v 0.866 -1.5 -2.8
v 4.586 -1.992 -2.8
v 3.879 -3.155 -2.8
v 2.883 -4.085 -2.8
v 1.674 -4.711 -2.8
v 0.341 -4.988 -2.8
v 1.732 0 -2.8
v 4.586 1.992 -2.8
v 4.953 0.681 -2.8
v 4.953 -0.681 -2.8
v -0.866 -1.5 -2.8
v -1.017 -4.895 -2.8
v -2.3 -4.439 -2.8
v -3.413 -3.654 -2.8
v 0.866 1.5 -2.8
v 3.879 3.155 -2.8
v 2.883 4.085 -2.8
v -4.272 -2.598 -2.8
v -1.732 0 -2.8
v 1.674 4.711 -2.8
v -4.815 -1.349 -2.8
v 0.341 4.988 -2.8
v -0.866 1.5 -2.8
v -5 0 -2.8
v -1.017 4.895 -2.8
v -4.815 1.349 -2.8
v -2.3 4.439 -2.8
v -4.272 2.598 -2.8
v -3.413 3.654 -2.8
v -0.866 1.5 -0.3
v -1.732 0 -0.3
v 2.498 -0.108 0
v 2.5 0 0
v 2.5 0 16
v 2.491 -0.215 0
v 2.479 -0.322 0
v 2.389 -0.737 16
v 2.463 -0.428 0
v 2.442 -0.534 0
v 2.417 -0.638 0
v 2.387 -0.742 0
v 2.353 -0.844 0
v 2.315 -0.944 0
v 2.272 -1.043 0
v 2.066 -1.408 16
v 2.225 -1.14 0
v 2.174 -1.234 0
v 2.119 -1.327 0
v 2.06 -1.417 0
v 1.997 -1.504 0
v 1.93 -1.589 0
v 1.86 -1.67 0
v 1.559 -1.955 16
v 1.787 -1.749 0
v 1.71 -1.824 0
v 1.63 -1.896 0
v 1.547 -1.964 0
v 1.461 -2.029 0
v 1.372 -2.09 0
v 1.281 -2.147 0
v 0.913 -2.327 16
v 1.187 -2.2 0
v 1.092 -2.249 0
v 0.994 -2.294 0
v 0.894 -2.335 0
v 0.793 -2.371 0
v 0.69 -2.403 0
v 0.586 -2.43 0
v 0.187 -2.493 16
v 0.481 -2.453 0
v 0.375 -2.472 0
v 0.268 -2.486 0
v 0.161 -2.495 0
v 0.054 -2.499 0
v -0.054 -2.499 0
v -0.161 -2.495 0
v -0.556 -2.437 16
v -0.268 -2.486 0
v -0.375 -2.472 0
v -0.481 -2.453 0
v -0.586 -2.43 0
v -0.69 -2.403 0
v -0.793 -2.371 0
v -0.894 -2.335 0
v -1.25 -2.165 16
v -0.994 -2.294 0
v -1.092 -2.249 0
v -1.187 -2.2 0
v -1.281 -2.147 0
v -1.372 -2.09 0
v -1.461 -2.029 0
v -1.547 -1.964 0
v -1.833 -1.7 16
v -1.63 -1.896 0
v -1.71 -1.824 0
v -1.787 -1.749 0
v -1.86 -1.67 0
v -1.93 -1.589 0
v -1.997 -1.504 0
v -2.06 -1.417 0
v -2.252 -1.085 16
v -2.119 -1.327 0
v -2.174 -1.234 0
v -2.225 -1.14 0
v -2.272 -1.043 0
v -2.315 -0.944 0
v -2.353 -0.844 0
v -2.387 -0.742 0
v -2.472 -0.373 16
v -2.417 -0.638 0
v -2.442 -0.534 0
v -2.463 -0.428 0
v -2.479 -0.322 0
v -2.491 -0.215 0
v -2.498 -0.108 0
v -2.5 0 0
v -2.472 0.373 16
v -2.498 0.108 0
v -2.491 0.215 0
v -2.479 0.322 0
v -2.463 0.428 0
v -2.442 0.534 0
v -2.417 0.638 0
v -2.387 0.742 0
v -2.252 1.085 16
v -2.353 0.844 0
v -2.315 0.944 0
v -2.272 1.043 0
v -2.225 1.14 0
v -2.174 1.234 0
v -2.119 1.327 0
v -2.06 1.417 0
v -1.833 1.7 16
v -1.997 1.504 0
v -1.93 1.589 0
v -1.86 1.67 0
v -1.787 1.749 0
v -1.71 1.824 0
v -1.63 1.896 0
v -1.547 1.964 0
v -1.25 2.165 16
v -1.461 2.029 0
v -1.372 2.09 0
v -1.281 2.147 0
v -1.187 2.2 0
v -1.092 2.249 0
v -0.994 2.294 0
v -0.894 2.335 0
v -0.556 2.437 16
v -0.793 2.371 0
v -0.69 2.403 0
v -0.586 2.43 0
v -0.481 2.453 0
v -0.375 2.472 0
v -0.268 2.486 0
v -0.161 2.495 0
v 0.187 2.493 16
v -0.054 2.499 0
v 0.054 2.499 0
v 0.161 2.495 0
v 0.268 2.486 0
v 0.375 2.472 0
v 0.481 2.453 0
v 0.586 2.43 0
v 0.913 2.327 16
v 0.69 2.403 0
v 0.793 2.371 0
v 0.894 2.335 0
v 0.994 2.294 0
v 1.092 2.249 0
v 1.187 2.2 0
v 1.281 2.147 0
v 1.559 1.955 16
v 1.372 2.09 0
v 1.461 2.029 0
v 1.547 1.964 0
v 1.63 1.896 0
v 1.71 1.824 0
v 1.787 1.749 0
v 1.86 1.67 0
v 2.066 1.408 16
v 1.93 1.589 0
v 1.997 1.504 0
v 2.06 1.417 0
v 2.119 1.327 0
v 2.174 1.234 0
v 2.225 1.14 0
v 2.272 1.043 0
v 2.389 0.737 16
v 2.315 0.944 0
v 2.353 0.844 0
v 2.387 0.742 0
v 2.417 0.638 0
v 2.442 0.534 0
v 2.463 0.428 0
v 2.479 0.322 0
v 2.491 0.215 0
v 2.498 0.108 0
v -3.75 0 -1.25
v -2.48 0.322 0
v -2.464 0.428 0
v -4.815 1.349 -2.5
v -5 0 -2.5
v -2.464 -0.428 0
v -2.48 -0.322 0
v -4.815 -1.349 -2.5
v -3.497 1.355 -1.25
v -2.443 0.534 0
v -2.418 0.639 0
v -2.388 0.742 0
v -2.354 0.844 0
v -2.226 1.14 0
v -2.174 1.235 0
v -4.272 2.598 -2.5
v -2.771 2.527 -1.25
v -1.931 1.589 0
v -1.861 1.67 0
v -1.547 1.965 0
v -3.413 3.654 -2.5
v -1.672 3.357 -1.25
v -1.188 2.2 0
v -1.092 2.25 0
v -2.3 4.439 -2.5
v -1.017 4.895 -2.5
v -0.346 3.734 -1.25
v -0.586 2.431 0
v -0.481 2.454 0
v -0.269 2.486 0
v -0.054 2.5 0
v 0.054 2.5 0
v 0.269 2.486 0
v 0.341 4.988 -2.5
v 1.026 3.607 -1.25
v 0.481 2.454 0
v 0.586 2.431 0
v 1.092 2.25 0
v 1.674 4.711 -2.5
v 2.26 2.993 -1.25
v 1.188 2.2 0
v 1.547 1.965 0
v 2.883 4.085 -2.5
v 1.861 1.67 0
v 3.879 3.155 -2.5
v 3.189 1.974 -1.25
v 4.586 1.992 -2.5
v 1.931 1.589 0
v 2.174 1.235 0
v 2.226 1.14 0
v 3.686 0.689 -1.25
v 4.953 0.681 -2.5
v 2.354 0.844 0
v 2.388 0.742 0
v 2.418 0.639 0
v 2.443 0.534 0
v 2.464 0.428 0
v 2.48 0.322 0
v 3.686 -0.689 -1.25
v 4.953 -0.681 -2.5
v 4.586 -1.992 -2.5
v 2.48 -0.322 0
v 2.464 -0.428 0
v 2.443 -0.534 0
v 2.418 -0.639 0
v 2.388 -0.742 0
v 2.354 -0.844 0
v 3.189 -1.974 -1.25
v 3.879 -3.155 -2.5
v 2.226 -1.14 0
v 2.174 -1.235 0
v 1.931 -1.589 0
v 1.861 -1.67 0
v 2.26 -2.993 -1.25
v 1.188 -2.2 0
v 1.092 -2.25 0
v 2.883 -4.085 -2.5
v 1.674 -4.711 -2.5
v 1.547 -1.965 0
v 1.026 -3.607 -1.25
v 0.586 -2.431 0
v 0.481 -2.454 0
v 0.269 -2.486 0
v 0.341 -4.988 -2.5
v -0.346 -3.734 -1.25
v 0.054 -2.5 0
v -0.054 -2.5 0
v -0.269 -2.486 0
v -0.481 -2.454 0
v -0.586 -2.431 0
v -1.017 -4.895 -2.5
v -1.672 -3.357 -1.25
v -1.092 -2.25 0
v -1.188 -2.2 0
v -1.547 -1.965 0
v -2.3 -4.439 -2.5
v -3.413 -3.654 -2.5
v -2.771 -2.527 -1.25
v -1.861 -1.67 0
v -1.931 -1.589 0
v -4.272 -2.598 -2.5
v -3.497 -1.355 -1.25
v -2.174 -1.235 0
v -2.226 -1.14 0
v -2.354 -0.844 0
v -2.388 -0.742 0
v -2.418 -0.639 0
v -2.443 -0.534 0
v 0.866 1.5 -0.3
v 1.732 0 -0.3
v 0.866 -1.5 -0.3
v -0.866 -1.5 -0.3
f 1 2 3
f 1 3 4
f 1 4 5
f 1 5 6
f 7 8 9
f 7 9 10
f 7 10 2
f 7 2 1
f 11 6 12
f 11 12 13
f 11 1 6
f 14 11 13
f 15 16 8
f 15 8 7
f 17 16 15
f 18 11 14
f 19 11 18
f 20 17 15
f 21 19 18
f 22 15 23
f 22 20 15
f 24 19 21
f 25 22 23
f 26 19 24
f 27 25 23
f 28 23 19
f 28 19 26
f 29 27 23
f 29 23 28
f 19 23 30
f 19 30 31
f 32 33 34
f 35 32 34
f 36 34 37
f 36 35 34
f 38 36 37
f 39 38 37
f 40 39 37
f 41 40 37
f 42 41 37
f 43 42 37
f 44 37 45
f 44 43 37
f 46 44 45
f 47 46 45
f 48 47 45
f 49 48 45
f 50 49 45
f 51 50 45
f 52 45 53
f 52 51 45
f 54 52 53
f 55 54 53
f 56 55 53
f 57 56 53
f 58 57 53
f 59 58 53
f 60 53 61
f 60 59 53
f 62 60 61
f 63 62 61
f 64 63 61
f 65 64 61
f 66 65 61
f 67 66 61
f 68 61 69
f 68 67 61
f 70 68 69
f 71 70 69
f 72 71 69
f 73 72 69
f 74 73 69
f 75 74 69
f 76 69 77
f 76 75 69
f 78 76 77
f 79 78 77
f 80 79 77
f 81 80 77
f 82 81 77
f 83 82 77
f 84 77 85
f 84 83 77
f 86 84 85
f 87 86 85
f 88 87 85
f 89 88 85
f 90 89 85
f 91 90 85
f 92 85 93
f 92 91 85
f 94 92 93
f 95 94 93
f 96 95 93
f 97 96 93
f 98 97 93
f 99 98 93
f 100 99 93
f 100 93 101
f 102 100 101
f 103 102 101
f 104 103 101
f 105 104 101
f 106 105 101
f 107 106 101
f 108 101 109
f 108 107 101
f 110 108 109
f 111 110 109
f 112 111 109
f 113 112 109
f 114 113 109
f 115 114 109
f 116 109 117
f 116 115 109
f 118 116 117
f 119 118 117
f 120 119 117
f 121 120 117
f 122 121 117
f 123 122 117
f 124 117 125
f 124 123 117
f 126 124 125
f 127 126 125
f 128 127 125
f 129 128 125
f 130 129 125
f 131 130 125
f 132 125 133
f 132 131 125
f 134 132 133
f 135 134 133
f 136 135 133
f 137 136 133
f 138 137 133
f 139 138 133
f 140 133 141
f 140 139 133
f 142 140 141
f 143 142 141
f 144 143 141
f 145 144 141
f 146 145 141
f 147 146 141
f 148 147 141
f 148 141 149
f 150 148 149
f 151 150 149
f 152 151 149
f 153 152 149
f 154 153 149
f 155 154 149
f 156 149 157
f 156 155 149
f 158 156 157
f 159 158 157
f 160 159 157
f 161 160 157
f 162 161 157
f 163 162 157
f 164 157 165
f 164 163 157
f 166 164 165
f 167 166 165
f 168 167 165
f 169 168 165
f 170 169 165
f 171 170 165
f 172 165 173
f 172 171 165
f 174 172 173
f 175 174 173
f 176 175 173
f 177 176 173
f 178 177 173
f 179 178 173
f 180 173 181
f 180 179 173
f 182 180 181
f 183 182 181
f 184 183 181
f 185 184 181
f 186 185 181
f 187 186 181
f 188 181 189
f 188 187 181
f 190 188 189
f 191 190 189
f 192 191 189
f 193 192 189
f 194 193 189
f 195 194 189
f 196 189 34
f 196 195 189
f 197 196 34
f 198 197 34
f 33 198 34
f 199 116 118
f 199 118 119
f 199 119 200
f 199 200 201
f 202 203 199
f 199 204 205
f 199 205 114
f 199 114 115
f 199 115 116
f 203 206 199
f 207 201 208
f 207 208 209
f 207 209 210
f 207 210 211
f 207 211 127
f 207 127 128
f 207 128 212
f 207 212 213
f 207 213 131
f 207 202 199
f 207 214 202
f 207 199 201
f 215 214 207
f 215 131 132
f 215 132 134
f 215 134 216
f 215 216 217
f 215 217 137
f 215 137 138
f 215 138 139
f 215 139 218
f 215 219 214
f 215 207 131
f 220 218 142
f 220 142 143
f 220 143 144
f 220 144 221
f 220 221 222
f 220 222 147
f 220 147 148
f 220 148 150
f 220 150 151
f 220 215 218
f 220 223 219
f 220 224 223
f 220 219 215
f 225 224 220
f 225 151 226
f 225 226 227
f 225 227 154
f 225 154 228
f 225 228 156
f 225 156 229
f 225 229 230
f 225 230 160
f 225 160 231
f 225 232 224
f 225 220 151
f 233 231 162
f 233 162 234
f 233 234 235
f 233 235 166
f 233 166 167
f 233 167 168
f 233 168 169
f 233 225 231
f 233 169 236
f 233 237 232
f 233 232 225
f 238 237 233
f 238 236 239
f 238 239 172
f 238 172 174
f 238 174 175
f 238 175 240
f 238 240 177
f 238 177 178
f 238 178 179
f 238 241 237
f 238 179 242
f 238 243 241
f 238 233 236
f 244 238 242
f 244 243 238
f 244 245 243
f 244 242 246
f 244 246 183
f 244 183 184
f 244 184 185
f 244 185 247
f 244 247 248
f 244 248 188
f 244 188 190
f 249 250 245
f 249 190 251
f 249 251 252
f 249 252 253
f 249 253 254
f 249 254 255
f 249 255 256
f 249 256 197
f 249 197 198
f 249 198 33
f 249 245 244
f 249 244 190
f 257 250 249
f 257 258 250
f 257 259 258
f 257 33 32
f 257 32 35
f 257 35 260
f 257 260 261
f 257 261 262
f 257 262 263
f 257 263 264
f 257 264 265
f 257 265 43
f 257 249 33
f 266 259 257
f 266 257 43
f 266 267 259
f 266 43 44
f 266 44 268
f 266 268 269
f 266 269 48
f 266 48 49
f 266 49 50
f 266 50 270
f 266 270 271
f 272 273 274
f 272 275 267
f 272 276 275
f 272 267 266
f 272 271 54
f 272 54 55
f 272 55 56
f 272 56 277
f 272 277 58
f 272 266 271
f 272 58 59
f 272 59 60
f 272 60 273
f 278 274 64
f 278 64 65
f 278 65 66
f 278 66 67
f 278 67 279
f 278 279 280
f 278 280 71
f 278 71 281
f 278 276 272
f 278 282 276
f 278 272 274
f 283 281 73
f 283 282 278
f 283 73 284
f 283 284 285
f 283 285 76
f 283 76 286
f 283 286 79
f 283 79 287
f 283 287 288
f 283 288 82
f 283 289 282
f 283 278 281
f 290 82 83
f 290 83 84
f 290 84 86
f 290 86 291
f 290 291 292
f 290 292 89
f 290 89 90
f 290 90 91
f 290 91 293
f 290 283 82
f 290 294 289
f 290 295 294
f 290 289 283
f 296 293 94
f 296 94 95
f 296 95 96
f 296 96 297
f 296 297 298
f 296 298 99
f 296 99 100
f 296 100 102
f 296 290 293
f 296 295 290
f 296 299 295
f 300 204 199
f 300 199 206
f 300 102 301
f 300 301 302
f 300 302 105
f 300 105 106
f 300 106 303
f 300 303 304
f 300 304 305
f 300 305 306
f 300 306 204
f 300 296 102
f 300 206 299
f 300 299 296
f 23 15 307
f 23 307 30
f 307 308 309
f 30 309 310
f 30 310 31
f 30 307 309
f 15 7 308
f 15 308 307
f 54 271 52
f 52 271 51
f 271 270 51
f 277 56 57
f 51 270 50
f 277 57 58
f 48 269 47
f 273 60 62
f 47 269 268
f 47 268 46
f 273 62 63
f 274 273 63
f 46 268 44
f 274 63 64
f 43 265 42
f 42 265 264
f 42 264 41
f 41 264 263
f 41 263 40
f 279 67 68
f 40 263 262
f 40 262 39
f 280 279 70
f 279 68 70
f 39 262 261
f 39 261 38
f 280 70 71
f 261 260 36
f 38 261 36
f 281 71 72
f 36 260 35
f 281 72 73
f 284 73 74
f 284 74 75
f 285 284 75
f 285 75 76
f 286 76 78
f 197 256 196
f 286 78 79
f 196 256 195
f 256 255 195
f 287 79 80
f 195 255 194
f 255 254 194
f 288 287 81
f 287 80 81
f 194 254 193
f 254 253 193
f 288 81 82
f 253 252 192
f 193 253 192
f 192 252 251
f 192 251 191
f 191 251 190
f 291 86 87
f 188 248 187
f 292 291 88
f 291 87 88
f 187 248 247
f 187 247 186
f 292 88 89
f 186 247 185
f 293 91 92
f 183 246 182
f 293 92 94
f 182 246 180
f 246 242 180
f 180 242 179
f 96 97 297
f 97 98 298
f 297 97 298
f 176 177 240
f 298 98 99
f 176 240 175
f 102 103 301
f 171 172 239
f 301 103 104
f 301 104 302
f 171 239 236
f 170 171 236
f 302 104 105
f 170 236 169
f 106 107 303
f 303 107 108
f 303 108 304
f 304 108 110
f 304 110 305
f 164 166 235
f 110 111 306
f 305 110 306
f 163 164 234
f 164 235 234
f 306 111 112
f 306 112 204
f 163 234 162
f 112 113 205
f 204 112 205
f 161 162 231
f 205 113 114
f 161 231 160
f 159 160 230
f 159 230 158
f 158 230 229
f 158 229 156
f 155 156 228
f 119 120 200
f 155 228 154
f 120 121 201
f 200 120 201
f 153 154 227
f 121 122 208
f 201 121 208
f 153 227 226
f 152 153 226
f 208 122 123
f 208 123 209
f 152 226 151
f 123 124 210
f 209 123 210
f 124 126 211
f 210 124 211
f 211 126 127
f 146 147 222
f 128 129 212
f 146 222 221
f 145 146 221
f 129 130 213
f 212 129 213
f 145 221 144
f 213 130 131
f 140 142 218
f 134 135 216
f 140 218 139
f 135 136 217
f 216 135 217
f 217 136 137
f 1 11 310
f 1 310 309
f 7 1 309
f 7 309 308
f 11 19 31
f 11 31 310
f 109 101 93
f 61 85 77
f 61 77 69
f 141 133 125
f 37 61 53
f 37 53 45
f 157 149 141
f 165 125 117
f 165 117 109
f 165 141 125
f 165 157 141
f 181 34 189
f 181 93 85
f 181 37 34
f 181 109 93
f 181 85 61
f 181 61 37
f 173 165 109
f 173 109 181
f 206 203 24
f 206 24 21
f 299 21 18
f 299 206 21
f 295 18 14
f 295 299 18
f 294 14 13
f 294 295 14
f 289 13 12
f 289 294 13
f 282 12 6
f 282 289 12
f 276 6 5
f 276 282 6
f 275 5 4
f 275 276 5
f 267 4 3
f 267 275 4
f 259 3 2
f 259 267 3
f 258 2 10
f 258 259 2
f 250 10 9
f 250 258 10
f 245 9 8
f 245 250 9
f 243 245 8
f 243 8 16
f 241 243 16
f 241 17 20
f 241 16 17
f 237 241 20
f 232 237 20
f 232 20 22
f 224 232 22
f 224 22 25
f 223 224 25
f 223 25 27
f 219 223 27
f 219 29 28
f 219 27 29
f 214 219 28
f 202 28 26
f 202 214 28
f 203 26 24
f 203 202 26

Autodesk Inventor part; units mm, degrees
ref_plane "YZ Plane" through (0, 0, 0) normal (1, 0, 0) x (0, 1, 0)
ref_plane "XZ Plane" through (0, 0, 0) normal (0, 1, 0) x (-1, 0, 0)
ref_plane "XY Plane" through (0, 0, 0) normal (0, 0, 1) x (1, 0, 0)
sketch "スケッチ1" plane through (0, 0, 0) normal (0, 0, 1) x (1, 0, 0)
  circle A0 centre (0, 0) radius 2.5
  dimension "d0" = 5
extrude "押し出し1" add sketch "スケッチ1" along normal blind 16
sketch "スケッチ2" plane through (0, 0, 0) normal (0, 0, -1) x (-1, 0, 0)
  circle A0 centre (0, 0) radius 5
  dimension "d3" = 10
extrude "押し出し2" add sketch "スケッチ2" along normal blind 2.8
chamfer "面取り1" distance 2.5 angle 45 1 edges at (5, 0, 0)
thread "ねじ1" size "M5x0.8" class "6g" standard "ANSI Metric M Profile" full length
sketch "スケッチ3" plane through (0, 0, -2.8) normal (0, 0, -1) x (-1, 0, 0)
  line L0 (1.7321, 0) -> (0.866, -1.5)
  line L1 (0.866, -1.5) -> (-0.866, -1.5)
  line L2 (-0.866, -1.5) -> (-1.7321, 0)
  line L3 (-1.7321, 0) -> (-0.866, 1.5)
  line L4 (-0.866, 1.5) -> (0.866, 1.5)
  line L5 (0.866, 1.5) -> (1.7321, 0)
  point P0 (0, 0)
  point P1 (0, 0)
  dimension "d11" = 3
extrude "押し出し3" cut sketch "スケッチ3" against normal blind 2.5
properties part number "M5皿ネジ　１６" material "鉄 灰色"
